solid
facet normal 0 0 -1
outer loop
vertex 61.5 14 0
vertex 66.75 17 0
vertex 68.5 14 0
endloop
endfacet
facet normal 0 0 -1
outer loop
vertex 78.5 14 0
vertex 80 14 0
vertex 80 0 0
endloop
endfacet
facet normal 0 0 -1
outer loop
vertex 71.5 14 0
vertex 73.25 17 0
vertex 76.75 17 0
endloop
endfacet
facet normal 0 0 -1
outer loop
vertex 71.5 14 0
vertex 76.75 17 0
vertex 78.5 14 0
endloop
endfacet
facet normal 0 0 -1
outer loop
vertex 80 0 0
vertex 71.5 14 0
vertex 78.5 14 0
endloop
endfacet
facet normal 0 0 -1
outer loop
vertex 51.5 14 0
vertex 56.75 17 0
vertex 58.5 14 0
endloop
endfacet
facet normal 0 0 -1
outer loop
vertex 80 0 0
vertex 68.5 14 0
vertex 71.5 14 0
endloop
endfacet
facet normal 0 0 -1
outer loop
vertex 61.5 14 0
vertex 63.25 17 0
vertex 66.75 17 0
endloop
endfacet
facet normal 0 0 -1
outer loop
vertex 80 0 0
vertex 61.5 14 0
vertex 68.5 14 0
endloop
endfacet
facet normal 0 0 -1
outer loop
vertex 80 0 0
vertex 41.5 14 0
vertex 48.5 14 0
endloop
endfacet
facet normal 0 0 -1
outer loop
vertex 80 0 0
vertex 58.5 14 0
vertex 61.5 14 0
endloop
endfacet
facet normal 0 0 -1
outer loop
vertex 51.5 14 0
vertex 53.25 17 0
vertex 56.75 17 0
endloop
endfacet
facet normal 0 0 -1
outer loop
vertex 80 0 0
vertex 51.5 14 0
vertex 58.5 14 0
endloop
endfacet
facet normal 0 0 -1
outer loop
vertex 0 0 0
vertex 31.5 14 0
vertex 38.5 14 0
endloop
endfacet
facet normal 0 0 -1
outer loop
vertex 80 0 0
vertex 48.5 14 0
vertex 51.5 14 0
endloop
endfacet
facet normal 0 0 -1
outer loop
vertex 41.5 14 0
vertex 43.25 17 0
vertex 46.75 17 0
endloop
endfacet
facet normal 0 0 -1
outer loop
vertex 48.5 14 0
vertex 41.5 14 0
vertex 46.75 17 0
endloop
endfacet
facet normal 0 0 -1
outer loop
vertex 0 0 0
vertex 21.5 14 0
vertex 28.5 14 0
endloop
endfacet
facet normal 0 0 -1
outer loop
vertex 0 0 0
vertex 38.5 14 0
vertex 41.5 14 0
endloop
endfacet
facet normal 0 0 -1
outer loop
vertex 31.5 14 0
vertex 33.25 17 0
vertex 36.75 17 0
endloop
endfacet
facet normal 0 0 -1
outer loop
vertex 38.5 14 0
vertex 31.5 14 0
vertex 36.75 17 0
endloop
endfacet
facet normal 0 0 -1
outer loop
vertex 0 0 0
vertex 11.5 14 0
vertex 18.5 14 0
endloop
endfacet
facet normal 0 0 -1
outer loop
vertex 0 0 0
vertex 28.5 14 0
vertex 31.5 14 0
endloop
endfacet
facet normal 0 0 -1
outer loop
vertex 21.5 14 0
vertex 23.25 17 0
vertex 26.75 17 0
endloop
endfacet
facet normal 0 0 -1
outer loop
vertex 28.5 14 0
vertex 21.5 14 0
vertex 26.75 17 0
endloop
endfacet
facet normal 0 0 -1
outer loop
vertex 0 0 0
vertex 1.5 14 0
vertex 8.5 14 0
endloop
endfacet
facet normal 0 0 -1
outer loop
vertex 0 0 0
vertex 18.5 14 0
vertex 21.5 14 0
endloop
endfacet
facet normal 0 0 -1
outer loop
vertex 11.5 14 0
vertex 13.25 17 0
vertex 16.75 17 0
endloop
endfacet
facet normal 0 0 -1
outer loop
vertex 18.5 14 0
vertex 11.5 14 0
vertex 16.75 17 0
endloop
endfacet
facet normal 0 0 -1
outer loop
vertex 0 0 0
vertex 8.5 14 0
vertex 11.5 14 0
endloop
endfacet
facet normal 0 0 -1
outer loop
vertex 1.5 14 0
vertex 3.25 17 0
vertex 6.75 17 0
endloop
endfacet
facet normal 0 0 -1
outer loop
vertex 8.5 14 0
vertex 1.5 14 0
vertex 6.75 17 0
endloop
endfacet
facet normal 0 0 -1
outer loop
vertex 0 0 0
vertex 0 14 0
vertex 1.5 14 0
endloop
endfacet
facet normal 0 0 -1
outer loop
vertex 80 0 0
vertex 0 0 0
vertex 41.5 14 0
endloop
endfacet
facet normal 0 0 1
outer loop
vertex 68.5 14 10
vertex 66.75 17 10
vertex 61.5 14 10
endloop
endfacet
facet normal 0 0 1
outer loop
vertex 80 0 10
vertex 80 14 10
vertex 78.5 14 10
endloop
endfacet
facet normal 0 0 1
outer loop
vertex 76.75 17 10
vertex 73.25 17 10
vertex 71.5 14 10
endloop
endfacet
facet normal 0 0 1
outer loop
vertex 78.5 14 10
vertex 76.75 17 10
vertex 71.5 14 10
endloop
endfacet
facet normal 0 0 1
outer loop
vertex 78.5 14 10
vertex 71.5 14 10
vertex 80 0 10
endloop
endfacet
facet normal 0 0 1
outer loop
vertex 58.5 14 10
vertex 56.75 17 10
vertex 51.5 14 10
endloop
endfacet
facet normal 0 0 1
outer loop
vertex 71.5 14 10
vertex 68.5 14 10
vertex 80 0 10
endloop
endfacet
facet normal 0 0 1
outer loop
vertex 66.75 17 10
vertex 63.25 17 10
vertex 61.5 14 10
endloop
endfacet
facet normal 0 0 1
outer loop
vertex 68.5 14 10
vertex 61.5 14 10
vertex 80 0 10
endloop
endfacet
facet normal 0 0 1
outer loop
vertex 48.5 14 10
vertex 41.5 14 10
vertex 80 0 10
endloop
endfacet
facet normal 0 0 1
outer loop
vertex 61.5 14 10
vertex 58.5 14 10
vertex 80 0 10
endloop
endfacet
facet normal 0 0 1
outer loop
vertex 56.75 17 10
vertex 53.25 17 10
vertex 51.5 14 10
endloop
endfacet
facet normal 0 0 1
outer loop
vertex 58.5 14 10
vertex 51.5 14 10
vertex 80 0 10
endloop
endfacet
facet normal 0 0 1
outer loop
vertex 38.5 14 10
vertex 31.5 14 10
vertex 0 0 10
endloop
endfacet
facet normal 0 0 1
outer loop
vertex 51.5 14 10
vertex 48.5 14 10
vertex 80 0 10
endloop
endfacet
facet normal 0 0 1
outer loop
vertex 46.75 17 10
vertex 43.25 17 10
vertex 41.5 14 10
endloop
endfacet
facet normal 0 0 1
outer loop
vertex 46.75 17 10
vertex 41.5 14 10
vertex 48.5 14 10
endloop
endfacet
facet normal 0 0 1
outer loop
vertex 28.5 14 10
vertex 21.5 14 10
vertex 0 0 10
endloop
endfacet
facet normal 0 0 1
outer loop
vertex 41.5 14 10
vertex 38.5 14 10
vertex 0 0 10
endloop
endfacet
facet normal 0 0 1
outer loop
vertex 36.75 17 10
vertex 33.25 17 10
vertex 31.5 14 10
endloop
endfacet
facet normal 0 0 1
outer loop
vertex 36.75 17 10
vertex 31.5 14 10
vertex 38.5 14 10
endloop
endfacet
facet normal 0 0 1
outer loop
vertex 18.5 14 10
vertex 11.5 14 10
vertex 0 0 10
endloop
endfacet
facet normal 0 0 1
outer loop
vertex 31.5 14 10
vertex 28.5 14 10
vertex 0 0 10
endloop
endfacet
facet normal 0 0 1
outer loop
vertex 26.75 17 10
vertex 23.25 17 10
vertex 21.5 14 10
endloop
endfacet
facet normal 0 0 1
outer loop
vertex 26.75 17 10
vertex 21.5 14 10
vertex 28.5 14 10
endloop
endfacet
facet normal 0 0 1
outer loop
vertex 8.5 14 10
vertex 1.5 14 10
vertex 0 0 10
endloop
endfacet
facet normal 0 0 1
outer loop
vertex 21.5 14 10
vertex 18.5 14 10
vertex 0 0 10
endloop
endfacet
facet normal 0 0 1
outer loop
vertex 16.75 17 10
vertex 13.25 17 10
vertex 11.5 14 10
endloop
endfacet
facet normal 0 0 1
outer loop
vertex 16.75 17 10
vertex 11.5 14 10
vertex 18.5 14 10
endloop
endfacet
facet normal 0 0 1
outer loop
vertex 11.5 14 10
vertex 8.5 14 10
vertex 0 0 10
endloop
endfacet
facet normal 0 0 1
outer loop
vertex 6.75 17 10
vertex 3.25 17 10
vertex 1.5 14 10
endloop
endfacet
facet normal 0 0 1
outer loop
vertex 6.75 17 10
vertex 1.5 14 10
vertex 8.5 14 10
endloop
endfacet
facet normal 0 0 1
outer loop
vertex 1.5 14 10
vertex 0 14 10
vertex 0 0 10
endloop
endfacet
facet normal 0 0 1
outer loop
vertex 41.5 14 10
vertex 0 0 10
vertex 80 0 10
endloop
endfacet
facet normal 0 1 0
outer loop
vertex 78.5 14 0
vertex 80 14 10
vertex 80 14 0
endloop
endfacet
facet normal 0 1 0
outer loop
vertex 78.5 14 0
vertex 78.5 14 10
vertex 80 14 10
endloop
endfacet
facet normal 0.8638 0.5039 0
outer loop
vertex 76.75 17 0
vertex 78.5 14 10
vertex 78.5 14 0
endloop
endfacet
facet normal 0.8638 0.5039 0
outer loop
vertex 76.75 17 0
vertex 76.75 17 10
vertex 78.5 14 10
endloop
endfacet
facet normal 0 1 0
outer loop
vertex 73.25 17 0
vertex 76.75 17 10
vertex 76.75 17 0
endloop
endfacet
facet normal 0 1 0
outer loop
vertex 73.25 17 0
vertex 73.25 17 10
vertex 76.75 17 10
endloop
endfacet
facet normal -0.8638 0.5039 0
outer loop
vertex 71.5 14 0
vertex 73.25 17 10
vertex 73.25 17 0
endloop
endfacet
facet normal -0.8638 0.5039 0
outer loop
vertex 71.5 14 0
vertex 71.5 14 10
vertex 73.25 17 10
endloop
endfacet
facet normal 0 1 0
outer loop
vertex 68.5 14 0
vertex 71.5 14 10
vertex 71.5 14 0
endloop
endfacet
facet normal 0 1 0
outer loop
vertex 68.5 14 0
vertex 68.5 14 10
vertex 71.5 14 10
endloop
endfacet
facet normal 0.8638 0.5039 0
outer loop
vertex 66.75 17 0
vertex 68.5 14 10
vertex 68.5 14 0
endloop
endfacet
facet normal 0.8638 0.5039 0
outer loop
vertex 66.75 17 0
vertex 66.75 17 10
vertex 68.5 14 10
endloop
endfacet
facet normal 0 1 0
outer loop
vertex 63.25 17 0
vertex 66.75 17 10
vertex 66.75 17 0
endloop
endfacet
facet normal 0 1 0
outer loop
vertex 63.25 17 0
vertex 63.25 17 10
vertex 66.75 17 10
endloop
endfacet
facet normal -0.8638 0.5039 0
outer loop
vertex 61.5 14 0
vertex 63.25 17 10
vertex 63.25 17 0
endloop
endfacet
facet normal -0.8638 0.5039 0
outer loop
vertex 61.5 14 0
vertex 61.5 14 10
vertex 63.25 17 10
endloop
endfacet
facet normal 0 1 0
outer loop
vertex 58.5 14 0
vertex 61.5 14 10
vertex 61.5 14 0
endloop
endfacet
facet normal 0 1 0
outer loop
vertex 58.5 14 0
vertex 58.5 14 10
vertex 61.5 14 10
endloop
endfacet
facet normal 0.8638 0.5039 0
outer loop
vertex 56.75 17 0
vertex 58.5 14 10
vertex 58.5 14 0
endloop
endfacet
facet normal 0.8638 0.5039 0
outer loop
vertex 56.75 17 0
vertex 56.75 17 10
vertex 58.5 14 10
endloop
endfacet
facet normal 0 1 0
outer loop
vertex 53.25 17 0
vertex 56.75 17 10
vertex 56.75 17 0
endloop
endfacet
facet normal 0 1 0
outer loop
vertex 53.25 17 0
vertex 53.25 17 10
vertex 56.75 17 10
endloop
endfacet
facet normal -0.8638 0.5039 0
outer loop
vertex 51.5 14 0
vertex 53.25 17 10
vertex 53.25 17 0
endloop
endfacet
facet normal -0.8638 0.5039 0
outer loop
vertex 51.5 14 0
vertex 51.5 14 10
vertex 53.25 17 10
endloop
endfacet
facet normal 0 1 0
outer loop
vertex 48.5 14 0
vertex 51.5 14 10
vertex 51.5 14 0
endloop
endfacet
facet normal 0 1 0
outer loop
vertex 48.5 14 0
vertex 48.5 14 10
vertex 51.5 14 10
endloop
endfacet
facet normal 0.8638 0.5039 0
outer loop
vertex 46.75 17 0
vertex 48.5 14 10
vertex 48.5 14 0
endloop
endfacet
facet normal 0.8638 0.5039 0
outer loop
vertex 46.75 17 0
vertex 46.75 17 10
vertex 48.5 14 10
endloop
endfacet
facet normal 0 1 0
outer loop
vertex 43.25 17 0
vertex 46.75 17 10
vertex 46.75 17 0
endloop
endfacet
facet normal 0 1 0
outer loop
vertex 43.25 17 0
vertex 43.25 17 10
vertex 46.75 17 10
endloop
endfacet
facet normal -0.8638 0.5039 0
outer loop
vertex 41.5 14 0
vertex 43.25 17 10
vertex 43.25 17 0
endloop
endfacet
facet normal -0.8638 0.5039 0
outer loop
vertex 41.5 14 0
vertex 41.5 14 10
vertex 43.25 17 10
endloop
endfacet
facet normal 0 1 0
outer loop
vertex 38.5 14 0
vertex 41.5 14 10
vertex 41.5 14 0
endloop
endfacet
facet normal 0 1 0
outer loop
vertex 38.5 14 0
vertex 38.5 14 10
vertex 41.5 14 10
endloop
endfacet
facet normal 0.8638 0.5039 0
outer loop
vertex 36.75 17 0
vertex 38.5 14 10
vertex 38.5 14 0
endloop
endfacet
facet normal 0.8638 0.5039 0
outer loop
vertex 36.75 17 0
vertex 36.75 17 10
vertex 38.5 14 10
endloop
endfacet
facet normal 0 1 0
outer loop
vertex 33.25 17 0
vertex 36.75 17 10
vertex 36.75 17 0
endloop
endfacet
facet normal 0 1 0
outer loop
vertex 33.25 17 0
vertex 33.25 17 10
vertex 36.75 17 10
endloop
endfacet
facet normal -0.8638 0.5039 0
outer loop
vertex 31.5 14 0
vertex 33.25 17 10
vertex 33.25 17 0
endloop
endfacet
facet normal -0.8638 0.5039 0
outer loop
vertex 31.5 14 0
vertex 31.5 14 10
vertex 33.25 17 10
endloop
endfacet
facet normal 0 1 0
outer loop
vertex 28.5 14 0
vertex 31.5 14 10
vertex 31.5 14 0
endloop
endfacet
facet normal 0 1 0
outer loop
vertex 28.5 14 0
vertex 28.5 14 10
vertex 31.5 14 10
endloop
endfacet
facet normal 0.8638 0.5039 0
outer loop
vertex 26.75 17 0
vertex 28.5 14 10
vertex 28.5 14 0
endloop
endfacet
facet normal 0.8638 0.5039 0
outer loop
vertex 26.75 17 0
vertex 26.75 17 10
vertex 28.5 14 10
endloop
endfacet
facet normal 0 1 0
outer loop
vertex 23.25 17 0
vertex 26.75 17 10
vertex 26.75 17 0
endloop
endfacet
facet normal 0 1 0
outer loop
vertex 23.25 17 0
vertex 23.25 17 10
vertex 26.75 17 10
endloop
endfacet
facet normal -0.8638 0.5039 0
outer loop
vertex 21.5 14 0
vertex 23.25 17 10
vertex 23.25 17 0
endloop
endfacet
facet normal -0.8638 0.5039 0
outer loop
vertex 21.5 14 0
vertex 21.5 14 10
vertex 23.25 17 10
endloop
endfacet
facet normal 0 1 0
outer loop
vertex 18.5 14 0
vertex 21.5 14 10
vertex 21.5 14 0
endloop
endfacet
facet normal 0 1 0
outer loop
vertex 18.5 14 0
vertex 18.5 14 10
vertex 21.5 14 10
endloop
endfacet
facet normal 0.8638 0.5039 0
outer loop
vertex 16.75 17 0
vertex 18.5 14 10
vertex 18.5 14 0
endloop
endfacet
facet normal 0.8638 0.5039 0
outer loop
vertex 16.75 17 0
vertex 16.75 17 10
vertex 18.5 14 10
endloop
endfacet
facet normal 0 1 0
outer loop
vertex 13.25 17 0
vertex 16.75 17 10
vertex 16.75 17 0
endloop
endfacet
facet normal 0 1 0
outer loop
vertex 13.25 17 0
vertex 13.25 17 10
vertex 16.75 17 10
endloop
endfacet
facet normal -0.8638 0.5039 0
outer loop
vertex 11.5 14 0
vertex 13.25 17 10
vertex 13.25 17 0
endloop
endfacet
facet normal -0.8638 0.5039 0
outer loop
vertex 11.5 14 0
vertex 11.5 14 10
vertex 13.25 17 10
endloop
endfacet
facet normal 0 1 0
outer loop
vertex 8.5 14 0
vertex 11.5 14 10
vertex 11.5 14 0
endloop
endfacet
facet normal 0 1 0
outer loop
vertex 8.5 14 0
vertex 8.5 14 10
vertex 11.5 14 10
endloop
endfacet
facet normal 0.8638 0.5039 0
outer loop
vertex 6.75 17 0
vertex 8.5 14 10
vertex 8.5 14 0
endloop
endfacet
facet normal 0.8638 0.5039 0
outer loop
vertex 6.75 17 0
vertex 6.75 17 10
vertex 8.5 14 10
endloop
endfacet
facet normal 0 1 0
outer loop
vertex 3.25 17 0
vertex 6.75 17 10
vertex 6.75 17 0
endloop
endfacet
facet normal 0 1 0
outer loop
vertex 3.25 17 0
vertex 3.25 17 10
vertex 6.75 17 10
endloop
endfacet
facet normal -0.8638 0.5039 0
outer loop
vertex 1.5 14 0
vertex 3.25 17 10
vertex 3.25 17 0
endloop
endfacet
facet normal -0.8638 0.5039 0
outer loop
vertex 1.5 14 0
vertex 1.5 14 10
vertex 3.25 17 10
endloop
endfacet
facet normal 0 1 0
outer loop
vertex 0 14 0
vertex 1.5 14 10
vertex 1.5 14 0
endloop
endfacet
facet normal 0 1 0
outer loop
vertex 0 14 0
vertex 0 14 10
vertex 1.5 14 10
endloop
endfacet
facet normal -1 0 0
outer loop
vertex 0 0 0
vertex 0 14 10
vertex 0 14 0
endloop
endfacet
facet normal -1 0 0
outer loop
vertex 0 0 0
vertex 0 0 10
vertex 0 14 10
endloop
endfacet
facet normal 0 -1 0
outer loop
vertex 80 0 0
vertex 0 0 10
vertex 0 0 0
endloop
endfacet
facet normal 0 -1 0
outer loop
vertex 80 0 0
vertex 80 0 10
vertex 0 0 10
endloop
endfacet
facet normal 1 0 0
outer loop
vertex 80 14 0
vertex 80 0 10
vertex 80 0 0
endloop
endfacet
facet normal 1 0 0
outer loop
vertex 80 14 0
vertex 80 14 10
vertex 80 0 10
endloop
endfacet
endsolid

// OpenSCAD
$fn = 32;

// ----------------------------------------------------------------------
// Gear rack: 8 teeth, pitch 10 mm
// ----------------------------------------------------------------------

// --- parameters (mm) ---
teeth = 8;                // number of teeth
pitch = 10;               // tooth pitch, X
root_w = 7;               // tooth width at the root
tip_w = 3.5;              // tooth width at the tip
base_h = 14;              // rack body height, Y
tooth_h = 3;              // tooth height above the body
plate_t = 10;             // rack width, Z (extrusion height)

rack_l = teeth * pitch;  // overall length
total_h = base_h + tooth_h;  // overall height

profile = [[0, 0], [80, 0], [80, 14], [78.5, 14], [76.75, 17], [73.25, 17], [71.5, 14], [68.5, 14], [66.75, 17], [63.25, 17], [61.5, 14], [58.5, 14], [56.75, 17], [53.25, 17], [51.5, 14], [48.5, 14], [46.75, 17], [43.25, 17], [41.5, 14], [38.5, 14], [36.75, 17], [33.25, 17], [31.5, 14], [28.5, 14], [26.75, 17], [23.25, 17], [21.5, 14], [18.5, 14], [16.75, 17], [13.25, 17], [11.5, 14], [8.5, 14], [6.75, 17], [3.25, 17], [1.5, 14], [0, 14]];  // primary outline, 36 points, counter clockwise

// --- the one profile operation ---
linear_extrude(height = plate_t) polygon(points = profile);
